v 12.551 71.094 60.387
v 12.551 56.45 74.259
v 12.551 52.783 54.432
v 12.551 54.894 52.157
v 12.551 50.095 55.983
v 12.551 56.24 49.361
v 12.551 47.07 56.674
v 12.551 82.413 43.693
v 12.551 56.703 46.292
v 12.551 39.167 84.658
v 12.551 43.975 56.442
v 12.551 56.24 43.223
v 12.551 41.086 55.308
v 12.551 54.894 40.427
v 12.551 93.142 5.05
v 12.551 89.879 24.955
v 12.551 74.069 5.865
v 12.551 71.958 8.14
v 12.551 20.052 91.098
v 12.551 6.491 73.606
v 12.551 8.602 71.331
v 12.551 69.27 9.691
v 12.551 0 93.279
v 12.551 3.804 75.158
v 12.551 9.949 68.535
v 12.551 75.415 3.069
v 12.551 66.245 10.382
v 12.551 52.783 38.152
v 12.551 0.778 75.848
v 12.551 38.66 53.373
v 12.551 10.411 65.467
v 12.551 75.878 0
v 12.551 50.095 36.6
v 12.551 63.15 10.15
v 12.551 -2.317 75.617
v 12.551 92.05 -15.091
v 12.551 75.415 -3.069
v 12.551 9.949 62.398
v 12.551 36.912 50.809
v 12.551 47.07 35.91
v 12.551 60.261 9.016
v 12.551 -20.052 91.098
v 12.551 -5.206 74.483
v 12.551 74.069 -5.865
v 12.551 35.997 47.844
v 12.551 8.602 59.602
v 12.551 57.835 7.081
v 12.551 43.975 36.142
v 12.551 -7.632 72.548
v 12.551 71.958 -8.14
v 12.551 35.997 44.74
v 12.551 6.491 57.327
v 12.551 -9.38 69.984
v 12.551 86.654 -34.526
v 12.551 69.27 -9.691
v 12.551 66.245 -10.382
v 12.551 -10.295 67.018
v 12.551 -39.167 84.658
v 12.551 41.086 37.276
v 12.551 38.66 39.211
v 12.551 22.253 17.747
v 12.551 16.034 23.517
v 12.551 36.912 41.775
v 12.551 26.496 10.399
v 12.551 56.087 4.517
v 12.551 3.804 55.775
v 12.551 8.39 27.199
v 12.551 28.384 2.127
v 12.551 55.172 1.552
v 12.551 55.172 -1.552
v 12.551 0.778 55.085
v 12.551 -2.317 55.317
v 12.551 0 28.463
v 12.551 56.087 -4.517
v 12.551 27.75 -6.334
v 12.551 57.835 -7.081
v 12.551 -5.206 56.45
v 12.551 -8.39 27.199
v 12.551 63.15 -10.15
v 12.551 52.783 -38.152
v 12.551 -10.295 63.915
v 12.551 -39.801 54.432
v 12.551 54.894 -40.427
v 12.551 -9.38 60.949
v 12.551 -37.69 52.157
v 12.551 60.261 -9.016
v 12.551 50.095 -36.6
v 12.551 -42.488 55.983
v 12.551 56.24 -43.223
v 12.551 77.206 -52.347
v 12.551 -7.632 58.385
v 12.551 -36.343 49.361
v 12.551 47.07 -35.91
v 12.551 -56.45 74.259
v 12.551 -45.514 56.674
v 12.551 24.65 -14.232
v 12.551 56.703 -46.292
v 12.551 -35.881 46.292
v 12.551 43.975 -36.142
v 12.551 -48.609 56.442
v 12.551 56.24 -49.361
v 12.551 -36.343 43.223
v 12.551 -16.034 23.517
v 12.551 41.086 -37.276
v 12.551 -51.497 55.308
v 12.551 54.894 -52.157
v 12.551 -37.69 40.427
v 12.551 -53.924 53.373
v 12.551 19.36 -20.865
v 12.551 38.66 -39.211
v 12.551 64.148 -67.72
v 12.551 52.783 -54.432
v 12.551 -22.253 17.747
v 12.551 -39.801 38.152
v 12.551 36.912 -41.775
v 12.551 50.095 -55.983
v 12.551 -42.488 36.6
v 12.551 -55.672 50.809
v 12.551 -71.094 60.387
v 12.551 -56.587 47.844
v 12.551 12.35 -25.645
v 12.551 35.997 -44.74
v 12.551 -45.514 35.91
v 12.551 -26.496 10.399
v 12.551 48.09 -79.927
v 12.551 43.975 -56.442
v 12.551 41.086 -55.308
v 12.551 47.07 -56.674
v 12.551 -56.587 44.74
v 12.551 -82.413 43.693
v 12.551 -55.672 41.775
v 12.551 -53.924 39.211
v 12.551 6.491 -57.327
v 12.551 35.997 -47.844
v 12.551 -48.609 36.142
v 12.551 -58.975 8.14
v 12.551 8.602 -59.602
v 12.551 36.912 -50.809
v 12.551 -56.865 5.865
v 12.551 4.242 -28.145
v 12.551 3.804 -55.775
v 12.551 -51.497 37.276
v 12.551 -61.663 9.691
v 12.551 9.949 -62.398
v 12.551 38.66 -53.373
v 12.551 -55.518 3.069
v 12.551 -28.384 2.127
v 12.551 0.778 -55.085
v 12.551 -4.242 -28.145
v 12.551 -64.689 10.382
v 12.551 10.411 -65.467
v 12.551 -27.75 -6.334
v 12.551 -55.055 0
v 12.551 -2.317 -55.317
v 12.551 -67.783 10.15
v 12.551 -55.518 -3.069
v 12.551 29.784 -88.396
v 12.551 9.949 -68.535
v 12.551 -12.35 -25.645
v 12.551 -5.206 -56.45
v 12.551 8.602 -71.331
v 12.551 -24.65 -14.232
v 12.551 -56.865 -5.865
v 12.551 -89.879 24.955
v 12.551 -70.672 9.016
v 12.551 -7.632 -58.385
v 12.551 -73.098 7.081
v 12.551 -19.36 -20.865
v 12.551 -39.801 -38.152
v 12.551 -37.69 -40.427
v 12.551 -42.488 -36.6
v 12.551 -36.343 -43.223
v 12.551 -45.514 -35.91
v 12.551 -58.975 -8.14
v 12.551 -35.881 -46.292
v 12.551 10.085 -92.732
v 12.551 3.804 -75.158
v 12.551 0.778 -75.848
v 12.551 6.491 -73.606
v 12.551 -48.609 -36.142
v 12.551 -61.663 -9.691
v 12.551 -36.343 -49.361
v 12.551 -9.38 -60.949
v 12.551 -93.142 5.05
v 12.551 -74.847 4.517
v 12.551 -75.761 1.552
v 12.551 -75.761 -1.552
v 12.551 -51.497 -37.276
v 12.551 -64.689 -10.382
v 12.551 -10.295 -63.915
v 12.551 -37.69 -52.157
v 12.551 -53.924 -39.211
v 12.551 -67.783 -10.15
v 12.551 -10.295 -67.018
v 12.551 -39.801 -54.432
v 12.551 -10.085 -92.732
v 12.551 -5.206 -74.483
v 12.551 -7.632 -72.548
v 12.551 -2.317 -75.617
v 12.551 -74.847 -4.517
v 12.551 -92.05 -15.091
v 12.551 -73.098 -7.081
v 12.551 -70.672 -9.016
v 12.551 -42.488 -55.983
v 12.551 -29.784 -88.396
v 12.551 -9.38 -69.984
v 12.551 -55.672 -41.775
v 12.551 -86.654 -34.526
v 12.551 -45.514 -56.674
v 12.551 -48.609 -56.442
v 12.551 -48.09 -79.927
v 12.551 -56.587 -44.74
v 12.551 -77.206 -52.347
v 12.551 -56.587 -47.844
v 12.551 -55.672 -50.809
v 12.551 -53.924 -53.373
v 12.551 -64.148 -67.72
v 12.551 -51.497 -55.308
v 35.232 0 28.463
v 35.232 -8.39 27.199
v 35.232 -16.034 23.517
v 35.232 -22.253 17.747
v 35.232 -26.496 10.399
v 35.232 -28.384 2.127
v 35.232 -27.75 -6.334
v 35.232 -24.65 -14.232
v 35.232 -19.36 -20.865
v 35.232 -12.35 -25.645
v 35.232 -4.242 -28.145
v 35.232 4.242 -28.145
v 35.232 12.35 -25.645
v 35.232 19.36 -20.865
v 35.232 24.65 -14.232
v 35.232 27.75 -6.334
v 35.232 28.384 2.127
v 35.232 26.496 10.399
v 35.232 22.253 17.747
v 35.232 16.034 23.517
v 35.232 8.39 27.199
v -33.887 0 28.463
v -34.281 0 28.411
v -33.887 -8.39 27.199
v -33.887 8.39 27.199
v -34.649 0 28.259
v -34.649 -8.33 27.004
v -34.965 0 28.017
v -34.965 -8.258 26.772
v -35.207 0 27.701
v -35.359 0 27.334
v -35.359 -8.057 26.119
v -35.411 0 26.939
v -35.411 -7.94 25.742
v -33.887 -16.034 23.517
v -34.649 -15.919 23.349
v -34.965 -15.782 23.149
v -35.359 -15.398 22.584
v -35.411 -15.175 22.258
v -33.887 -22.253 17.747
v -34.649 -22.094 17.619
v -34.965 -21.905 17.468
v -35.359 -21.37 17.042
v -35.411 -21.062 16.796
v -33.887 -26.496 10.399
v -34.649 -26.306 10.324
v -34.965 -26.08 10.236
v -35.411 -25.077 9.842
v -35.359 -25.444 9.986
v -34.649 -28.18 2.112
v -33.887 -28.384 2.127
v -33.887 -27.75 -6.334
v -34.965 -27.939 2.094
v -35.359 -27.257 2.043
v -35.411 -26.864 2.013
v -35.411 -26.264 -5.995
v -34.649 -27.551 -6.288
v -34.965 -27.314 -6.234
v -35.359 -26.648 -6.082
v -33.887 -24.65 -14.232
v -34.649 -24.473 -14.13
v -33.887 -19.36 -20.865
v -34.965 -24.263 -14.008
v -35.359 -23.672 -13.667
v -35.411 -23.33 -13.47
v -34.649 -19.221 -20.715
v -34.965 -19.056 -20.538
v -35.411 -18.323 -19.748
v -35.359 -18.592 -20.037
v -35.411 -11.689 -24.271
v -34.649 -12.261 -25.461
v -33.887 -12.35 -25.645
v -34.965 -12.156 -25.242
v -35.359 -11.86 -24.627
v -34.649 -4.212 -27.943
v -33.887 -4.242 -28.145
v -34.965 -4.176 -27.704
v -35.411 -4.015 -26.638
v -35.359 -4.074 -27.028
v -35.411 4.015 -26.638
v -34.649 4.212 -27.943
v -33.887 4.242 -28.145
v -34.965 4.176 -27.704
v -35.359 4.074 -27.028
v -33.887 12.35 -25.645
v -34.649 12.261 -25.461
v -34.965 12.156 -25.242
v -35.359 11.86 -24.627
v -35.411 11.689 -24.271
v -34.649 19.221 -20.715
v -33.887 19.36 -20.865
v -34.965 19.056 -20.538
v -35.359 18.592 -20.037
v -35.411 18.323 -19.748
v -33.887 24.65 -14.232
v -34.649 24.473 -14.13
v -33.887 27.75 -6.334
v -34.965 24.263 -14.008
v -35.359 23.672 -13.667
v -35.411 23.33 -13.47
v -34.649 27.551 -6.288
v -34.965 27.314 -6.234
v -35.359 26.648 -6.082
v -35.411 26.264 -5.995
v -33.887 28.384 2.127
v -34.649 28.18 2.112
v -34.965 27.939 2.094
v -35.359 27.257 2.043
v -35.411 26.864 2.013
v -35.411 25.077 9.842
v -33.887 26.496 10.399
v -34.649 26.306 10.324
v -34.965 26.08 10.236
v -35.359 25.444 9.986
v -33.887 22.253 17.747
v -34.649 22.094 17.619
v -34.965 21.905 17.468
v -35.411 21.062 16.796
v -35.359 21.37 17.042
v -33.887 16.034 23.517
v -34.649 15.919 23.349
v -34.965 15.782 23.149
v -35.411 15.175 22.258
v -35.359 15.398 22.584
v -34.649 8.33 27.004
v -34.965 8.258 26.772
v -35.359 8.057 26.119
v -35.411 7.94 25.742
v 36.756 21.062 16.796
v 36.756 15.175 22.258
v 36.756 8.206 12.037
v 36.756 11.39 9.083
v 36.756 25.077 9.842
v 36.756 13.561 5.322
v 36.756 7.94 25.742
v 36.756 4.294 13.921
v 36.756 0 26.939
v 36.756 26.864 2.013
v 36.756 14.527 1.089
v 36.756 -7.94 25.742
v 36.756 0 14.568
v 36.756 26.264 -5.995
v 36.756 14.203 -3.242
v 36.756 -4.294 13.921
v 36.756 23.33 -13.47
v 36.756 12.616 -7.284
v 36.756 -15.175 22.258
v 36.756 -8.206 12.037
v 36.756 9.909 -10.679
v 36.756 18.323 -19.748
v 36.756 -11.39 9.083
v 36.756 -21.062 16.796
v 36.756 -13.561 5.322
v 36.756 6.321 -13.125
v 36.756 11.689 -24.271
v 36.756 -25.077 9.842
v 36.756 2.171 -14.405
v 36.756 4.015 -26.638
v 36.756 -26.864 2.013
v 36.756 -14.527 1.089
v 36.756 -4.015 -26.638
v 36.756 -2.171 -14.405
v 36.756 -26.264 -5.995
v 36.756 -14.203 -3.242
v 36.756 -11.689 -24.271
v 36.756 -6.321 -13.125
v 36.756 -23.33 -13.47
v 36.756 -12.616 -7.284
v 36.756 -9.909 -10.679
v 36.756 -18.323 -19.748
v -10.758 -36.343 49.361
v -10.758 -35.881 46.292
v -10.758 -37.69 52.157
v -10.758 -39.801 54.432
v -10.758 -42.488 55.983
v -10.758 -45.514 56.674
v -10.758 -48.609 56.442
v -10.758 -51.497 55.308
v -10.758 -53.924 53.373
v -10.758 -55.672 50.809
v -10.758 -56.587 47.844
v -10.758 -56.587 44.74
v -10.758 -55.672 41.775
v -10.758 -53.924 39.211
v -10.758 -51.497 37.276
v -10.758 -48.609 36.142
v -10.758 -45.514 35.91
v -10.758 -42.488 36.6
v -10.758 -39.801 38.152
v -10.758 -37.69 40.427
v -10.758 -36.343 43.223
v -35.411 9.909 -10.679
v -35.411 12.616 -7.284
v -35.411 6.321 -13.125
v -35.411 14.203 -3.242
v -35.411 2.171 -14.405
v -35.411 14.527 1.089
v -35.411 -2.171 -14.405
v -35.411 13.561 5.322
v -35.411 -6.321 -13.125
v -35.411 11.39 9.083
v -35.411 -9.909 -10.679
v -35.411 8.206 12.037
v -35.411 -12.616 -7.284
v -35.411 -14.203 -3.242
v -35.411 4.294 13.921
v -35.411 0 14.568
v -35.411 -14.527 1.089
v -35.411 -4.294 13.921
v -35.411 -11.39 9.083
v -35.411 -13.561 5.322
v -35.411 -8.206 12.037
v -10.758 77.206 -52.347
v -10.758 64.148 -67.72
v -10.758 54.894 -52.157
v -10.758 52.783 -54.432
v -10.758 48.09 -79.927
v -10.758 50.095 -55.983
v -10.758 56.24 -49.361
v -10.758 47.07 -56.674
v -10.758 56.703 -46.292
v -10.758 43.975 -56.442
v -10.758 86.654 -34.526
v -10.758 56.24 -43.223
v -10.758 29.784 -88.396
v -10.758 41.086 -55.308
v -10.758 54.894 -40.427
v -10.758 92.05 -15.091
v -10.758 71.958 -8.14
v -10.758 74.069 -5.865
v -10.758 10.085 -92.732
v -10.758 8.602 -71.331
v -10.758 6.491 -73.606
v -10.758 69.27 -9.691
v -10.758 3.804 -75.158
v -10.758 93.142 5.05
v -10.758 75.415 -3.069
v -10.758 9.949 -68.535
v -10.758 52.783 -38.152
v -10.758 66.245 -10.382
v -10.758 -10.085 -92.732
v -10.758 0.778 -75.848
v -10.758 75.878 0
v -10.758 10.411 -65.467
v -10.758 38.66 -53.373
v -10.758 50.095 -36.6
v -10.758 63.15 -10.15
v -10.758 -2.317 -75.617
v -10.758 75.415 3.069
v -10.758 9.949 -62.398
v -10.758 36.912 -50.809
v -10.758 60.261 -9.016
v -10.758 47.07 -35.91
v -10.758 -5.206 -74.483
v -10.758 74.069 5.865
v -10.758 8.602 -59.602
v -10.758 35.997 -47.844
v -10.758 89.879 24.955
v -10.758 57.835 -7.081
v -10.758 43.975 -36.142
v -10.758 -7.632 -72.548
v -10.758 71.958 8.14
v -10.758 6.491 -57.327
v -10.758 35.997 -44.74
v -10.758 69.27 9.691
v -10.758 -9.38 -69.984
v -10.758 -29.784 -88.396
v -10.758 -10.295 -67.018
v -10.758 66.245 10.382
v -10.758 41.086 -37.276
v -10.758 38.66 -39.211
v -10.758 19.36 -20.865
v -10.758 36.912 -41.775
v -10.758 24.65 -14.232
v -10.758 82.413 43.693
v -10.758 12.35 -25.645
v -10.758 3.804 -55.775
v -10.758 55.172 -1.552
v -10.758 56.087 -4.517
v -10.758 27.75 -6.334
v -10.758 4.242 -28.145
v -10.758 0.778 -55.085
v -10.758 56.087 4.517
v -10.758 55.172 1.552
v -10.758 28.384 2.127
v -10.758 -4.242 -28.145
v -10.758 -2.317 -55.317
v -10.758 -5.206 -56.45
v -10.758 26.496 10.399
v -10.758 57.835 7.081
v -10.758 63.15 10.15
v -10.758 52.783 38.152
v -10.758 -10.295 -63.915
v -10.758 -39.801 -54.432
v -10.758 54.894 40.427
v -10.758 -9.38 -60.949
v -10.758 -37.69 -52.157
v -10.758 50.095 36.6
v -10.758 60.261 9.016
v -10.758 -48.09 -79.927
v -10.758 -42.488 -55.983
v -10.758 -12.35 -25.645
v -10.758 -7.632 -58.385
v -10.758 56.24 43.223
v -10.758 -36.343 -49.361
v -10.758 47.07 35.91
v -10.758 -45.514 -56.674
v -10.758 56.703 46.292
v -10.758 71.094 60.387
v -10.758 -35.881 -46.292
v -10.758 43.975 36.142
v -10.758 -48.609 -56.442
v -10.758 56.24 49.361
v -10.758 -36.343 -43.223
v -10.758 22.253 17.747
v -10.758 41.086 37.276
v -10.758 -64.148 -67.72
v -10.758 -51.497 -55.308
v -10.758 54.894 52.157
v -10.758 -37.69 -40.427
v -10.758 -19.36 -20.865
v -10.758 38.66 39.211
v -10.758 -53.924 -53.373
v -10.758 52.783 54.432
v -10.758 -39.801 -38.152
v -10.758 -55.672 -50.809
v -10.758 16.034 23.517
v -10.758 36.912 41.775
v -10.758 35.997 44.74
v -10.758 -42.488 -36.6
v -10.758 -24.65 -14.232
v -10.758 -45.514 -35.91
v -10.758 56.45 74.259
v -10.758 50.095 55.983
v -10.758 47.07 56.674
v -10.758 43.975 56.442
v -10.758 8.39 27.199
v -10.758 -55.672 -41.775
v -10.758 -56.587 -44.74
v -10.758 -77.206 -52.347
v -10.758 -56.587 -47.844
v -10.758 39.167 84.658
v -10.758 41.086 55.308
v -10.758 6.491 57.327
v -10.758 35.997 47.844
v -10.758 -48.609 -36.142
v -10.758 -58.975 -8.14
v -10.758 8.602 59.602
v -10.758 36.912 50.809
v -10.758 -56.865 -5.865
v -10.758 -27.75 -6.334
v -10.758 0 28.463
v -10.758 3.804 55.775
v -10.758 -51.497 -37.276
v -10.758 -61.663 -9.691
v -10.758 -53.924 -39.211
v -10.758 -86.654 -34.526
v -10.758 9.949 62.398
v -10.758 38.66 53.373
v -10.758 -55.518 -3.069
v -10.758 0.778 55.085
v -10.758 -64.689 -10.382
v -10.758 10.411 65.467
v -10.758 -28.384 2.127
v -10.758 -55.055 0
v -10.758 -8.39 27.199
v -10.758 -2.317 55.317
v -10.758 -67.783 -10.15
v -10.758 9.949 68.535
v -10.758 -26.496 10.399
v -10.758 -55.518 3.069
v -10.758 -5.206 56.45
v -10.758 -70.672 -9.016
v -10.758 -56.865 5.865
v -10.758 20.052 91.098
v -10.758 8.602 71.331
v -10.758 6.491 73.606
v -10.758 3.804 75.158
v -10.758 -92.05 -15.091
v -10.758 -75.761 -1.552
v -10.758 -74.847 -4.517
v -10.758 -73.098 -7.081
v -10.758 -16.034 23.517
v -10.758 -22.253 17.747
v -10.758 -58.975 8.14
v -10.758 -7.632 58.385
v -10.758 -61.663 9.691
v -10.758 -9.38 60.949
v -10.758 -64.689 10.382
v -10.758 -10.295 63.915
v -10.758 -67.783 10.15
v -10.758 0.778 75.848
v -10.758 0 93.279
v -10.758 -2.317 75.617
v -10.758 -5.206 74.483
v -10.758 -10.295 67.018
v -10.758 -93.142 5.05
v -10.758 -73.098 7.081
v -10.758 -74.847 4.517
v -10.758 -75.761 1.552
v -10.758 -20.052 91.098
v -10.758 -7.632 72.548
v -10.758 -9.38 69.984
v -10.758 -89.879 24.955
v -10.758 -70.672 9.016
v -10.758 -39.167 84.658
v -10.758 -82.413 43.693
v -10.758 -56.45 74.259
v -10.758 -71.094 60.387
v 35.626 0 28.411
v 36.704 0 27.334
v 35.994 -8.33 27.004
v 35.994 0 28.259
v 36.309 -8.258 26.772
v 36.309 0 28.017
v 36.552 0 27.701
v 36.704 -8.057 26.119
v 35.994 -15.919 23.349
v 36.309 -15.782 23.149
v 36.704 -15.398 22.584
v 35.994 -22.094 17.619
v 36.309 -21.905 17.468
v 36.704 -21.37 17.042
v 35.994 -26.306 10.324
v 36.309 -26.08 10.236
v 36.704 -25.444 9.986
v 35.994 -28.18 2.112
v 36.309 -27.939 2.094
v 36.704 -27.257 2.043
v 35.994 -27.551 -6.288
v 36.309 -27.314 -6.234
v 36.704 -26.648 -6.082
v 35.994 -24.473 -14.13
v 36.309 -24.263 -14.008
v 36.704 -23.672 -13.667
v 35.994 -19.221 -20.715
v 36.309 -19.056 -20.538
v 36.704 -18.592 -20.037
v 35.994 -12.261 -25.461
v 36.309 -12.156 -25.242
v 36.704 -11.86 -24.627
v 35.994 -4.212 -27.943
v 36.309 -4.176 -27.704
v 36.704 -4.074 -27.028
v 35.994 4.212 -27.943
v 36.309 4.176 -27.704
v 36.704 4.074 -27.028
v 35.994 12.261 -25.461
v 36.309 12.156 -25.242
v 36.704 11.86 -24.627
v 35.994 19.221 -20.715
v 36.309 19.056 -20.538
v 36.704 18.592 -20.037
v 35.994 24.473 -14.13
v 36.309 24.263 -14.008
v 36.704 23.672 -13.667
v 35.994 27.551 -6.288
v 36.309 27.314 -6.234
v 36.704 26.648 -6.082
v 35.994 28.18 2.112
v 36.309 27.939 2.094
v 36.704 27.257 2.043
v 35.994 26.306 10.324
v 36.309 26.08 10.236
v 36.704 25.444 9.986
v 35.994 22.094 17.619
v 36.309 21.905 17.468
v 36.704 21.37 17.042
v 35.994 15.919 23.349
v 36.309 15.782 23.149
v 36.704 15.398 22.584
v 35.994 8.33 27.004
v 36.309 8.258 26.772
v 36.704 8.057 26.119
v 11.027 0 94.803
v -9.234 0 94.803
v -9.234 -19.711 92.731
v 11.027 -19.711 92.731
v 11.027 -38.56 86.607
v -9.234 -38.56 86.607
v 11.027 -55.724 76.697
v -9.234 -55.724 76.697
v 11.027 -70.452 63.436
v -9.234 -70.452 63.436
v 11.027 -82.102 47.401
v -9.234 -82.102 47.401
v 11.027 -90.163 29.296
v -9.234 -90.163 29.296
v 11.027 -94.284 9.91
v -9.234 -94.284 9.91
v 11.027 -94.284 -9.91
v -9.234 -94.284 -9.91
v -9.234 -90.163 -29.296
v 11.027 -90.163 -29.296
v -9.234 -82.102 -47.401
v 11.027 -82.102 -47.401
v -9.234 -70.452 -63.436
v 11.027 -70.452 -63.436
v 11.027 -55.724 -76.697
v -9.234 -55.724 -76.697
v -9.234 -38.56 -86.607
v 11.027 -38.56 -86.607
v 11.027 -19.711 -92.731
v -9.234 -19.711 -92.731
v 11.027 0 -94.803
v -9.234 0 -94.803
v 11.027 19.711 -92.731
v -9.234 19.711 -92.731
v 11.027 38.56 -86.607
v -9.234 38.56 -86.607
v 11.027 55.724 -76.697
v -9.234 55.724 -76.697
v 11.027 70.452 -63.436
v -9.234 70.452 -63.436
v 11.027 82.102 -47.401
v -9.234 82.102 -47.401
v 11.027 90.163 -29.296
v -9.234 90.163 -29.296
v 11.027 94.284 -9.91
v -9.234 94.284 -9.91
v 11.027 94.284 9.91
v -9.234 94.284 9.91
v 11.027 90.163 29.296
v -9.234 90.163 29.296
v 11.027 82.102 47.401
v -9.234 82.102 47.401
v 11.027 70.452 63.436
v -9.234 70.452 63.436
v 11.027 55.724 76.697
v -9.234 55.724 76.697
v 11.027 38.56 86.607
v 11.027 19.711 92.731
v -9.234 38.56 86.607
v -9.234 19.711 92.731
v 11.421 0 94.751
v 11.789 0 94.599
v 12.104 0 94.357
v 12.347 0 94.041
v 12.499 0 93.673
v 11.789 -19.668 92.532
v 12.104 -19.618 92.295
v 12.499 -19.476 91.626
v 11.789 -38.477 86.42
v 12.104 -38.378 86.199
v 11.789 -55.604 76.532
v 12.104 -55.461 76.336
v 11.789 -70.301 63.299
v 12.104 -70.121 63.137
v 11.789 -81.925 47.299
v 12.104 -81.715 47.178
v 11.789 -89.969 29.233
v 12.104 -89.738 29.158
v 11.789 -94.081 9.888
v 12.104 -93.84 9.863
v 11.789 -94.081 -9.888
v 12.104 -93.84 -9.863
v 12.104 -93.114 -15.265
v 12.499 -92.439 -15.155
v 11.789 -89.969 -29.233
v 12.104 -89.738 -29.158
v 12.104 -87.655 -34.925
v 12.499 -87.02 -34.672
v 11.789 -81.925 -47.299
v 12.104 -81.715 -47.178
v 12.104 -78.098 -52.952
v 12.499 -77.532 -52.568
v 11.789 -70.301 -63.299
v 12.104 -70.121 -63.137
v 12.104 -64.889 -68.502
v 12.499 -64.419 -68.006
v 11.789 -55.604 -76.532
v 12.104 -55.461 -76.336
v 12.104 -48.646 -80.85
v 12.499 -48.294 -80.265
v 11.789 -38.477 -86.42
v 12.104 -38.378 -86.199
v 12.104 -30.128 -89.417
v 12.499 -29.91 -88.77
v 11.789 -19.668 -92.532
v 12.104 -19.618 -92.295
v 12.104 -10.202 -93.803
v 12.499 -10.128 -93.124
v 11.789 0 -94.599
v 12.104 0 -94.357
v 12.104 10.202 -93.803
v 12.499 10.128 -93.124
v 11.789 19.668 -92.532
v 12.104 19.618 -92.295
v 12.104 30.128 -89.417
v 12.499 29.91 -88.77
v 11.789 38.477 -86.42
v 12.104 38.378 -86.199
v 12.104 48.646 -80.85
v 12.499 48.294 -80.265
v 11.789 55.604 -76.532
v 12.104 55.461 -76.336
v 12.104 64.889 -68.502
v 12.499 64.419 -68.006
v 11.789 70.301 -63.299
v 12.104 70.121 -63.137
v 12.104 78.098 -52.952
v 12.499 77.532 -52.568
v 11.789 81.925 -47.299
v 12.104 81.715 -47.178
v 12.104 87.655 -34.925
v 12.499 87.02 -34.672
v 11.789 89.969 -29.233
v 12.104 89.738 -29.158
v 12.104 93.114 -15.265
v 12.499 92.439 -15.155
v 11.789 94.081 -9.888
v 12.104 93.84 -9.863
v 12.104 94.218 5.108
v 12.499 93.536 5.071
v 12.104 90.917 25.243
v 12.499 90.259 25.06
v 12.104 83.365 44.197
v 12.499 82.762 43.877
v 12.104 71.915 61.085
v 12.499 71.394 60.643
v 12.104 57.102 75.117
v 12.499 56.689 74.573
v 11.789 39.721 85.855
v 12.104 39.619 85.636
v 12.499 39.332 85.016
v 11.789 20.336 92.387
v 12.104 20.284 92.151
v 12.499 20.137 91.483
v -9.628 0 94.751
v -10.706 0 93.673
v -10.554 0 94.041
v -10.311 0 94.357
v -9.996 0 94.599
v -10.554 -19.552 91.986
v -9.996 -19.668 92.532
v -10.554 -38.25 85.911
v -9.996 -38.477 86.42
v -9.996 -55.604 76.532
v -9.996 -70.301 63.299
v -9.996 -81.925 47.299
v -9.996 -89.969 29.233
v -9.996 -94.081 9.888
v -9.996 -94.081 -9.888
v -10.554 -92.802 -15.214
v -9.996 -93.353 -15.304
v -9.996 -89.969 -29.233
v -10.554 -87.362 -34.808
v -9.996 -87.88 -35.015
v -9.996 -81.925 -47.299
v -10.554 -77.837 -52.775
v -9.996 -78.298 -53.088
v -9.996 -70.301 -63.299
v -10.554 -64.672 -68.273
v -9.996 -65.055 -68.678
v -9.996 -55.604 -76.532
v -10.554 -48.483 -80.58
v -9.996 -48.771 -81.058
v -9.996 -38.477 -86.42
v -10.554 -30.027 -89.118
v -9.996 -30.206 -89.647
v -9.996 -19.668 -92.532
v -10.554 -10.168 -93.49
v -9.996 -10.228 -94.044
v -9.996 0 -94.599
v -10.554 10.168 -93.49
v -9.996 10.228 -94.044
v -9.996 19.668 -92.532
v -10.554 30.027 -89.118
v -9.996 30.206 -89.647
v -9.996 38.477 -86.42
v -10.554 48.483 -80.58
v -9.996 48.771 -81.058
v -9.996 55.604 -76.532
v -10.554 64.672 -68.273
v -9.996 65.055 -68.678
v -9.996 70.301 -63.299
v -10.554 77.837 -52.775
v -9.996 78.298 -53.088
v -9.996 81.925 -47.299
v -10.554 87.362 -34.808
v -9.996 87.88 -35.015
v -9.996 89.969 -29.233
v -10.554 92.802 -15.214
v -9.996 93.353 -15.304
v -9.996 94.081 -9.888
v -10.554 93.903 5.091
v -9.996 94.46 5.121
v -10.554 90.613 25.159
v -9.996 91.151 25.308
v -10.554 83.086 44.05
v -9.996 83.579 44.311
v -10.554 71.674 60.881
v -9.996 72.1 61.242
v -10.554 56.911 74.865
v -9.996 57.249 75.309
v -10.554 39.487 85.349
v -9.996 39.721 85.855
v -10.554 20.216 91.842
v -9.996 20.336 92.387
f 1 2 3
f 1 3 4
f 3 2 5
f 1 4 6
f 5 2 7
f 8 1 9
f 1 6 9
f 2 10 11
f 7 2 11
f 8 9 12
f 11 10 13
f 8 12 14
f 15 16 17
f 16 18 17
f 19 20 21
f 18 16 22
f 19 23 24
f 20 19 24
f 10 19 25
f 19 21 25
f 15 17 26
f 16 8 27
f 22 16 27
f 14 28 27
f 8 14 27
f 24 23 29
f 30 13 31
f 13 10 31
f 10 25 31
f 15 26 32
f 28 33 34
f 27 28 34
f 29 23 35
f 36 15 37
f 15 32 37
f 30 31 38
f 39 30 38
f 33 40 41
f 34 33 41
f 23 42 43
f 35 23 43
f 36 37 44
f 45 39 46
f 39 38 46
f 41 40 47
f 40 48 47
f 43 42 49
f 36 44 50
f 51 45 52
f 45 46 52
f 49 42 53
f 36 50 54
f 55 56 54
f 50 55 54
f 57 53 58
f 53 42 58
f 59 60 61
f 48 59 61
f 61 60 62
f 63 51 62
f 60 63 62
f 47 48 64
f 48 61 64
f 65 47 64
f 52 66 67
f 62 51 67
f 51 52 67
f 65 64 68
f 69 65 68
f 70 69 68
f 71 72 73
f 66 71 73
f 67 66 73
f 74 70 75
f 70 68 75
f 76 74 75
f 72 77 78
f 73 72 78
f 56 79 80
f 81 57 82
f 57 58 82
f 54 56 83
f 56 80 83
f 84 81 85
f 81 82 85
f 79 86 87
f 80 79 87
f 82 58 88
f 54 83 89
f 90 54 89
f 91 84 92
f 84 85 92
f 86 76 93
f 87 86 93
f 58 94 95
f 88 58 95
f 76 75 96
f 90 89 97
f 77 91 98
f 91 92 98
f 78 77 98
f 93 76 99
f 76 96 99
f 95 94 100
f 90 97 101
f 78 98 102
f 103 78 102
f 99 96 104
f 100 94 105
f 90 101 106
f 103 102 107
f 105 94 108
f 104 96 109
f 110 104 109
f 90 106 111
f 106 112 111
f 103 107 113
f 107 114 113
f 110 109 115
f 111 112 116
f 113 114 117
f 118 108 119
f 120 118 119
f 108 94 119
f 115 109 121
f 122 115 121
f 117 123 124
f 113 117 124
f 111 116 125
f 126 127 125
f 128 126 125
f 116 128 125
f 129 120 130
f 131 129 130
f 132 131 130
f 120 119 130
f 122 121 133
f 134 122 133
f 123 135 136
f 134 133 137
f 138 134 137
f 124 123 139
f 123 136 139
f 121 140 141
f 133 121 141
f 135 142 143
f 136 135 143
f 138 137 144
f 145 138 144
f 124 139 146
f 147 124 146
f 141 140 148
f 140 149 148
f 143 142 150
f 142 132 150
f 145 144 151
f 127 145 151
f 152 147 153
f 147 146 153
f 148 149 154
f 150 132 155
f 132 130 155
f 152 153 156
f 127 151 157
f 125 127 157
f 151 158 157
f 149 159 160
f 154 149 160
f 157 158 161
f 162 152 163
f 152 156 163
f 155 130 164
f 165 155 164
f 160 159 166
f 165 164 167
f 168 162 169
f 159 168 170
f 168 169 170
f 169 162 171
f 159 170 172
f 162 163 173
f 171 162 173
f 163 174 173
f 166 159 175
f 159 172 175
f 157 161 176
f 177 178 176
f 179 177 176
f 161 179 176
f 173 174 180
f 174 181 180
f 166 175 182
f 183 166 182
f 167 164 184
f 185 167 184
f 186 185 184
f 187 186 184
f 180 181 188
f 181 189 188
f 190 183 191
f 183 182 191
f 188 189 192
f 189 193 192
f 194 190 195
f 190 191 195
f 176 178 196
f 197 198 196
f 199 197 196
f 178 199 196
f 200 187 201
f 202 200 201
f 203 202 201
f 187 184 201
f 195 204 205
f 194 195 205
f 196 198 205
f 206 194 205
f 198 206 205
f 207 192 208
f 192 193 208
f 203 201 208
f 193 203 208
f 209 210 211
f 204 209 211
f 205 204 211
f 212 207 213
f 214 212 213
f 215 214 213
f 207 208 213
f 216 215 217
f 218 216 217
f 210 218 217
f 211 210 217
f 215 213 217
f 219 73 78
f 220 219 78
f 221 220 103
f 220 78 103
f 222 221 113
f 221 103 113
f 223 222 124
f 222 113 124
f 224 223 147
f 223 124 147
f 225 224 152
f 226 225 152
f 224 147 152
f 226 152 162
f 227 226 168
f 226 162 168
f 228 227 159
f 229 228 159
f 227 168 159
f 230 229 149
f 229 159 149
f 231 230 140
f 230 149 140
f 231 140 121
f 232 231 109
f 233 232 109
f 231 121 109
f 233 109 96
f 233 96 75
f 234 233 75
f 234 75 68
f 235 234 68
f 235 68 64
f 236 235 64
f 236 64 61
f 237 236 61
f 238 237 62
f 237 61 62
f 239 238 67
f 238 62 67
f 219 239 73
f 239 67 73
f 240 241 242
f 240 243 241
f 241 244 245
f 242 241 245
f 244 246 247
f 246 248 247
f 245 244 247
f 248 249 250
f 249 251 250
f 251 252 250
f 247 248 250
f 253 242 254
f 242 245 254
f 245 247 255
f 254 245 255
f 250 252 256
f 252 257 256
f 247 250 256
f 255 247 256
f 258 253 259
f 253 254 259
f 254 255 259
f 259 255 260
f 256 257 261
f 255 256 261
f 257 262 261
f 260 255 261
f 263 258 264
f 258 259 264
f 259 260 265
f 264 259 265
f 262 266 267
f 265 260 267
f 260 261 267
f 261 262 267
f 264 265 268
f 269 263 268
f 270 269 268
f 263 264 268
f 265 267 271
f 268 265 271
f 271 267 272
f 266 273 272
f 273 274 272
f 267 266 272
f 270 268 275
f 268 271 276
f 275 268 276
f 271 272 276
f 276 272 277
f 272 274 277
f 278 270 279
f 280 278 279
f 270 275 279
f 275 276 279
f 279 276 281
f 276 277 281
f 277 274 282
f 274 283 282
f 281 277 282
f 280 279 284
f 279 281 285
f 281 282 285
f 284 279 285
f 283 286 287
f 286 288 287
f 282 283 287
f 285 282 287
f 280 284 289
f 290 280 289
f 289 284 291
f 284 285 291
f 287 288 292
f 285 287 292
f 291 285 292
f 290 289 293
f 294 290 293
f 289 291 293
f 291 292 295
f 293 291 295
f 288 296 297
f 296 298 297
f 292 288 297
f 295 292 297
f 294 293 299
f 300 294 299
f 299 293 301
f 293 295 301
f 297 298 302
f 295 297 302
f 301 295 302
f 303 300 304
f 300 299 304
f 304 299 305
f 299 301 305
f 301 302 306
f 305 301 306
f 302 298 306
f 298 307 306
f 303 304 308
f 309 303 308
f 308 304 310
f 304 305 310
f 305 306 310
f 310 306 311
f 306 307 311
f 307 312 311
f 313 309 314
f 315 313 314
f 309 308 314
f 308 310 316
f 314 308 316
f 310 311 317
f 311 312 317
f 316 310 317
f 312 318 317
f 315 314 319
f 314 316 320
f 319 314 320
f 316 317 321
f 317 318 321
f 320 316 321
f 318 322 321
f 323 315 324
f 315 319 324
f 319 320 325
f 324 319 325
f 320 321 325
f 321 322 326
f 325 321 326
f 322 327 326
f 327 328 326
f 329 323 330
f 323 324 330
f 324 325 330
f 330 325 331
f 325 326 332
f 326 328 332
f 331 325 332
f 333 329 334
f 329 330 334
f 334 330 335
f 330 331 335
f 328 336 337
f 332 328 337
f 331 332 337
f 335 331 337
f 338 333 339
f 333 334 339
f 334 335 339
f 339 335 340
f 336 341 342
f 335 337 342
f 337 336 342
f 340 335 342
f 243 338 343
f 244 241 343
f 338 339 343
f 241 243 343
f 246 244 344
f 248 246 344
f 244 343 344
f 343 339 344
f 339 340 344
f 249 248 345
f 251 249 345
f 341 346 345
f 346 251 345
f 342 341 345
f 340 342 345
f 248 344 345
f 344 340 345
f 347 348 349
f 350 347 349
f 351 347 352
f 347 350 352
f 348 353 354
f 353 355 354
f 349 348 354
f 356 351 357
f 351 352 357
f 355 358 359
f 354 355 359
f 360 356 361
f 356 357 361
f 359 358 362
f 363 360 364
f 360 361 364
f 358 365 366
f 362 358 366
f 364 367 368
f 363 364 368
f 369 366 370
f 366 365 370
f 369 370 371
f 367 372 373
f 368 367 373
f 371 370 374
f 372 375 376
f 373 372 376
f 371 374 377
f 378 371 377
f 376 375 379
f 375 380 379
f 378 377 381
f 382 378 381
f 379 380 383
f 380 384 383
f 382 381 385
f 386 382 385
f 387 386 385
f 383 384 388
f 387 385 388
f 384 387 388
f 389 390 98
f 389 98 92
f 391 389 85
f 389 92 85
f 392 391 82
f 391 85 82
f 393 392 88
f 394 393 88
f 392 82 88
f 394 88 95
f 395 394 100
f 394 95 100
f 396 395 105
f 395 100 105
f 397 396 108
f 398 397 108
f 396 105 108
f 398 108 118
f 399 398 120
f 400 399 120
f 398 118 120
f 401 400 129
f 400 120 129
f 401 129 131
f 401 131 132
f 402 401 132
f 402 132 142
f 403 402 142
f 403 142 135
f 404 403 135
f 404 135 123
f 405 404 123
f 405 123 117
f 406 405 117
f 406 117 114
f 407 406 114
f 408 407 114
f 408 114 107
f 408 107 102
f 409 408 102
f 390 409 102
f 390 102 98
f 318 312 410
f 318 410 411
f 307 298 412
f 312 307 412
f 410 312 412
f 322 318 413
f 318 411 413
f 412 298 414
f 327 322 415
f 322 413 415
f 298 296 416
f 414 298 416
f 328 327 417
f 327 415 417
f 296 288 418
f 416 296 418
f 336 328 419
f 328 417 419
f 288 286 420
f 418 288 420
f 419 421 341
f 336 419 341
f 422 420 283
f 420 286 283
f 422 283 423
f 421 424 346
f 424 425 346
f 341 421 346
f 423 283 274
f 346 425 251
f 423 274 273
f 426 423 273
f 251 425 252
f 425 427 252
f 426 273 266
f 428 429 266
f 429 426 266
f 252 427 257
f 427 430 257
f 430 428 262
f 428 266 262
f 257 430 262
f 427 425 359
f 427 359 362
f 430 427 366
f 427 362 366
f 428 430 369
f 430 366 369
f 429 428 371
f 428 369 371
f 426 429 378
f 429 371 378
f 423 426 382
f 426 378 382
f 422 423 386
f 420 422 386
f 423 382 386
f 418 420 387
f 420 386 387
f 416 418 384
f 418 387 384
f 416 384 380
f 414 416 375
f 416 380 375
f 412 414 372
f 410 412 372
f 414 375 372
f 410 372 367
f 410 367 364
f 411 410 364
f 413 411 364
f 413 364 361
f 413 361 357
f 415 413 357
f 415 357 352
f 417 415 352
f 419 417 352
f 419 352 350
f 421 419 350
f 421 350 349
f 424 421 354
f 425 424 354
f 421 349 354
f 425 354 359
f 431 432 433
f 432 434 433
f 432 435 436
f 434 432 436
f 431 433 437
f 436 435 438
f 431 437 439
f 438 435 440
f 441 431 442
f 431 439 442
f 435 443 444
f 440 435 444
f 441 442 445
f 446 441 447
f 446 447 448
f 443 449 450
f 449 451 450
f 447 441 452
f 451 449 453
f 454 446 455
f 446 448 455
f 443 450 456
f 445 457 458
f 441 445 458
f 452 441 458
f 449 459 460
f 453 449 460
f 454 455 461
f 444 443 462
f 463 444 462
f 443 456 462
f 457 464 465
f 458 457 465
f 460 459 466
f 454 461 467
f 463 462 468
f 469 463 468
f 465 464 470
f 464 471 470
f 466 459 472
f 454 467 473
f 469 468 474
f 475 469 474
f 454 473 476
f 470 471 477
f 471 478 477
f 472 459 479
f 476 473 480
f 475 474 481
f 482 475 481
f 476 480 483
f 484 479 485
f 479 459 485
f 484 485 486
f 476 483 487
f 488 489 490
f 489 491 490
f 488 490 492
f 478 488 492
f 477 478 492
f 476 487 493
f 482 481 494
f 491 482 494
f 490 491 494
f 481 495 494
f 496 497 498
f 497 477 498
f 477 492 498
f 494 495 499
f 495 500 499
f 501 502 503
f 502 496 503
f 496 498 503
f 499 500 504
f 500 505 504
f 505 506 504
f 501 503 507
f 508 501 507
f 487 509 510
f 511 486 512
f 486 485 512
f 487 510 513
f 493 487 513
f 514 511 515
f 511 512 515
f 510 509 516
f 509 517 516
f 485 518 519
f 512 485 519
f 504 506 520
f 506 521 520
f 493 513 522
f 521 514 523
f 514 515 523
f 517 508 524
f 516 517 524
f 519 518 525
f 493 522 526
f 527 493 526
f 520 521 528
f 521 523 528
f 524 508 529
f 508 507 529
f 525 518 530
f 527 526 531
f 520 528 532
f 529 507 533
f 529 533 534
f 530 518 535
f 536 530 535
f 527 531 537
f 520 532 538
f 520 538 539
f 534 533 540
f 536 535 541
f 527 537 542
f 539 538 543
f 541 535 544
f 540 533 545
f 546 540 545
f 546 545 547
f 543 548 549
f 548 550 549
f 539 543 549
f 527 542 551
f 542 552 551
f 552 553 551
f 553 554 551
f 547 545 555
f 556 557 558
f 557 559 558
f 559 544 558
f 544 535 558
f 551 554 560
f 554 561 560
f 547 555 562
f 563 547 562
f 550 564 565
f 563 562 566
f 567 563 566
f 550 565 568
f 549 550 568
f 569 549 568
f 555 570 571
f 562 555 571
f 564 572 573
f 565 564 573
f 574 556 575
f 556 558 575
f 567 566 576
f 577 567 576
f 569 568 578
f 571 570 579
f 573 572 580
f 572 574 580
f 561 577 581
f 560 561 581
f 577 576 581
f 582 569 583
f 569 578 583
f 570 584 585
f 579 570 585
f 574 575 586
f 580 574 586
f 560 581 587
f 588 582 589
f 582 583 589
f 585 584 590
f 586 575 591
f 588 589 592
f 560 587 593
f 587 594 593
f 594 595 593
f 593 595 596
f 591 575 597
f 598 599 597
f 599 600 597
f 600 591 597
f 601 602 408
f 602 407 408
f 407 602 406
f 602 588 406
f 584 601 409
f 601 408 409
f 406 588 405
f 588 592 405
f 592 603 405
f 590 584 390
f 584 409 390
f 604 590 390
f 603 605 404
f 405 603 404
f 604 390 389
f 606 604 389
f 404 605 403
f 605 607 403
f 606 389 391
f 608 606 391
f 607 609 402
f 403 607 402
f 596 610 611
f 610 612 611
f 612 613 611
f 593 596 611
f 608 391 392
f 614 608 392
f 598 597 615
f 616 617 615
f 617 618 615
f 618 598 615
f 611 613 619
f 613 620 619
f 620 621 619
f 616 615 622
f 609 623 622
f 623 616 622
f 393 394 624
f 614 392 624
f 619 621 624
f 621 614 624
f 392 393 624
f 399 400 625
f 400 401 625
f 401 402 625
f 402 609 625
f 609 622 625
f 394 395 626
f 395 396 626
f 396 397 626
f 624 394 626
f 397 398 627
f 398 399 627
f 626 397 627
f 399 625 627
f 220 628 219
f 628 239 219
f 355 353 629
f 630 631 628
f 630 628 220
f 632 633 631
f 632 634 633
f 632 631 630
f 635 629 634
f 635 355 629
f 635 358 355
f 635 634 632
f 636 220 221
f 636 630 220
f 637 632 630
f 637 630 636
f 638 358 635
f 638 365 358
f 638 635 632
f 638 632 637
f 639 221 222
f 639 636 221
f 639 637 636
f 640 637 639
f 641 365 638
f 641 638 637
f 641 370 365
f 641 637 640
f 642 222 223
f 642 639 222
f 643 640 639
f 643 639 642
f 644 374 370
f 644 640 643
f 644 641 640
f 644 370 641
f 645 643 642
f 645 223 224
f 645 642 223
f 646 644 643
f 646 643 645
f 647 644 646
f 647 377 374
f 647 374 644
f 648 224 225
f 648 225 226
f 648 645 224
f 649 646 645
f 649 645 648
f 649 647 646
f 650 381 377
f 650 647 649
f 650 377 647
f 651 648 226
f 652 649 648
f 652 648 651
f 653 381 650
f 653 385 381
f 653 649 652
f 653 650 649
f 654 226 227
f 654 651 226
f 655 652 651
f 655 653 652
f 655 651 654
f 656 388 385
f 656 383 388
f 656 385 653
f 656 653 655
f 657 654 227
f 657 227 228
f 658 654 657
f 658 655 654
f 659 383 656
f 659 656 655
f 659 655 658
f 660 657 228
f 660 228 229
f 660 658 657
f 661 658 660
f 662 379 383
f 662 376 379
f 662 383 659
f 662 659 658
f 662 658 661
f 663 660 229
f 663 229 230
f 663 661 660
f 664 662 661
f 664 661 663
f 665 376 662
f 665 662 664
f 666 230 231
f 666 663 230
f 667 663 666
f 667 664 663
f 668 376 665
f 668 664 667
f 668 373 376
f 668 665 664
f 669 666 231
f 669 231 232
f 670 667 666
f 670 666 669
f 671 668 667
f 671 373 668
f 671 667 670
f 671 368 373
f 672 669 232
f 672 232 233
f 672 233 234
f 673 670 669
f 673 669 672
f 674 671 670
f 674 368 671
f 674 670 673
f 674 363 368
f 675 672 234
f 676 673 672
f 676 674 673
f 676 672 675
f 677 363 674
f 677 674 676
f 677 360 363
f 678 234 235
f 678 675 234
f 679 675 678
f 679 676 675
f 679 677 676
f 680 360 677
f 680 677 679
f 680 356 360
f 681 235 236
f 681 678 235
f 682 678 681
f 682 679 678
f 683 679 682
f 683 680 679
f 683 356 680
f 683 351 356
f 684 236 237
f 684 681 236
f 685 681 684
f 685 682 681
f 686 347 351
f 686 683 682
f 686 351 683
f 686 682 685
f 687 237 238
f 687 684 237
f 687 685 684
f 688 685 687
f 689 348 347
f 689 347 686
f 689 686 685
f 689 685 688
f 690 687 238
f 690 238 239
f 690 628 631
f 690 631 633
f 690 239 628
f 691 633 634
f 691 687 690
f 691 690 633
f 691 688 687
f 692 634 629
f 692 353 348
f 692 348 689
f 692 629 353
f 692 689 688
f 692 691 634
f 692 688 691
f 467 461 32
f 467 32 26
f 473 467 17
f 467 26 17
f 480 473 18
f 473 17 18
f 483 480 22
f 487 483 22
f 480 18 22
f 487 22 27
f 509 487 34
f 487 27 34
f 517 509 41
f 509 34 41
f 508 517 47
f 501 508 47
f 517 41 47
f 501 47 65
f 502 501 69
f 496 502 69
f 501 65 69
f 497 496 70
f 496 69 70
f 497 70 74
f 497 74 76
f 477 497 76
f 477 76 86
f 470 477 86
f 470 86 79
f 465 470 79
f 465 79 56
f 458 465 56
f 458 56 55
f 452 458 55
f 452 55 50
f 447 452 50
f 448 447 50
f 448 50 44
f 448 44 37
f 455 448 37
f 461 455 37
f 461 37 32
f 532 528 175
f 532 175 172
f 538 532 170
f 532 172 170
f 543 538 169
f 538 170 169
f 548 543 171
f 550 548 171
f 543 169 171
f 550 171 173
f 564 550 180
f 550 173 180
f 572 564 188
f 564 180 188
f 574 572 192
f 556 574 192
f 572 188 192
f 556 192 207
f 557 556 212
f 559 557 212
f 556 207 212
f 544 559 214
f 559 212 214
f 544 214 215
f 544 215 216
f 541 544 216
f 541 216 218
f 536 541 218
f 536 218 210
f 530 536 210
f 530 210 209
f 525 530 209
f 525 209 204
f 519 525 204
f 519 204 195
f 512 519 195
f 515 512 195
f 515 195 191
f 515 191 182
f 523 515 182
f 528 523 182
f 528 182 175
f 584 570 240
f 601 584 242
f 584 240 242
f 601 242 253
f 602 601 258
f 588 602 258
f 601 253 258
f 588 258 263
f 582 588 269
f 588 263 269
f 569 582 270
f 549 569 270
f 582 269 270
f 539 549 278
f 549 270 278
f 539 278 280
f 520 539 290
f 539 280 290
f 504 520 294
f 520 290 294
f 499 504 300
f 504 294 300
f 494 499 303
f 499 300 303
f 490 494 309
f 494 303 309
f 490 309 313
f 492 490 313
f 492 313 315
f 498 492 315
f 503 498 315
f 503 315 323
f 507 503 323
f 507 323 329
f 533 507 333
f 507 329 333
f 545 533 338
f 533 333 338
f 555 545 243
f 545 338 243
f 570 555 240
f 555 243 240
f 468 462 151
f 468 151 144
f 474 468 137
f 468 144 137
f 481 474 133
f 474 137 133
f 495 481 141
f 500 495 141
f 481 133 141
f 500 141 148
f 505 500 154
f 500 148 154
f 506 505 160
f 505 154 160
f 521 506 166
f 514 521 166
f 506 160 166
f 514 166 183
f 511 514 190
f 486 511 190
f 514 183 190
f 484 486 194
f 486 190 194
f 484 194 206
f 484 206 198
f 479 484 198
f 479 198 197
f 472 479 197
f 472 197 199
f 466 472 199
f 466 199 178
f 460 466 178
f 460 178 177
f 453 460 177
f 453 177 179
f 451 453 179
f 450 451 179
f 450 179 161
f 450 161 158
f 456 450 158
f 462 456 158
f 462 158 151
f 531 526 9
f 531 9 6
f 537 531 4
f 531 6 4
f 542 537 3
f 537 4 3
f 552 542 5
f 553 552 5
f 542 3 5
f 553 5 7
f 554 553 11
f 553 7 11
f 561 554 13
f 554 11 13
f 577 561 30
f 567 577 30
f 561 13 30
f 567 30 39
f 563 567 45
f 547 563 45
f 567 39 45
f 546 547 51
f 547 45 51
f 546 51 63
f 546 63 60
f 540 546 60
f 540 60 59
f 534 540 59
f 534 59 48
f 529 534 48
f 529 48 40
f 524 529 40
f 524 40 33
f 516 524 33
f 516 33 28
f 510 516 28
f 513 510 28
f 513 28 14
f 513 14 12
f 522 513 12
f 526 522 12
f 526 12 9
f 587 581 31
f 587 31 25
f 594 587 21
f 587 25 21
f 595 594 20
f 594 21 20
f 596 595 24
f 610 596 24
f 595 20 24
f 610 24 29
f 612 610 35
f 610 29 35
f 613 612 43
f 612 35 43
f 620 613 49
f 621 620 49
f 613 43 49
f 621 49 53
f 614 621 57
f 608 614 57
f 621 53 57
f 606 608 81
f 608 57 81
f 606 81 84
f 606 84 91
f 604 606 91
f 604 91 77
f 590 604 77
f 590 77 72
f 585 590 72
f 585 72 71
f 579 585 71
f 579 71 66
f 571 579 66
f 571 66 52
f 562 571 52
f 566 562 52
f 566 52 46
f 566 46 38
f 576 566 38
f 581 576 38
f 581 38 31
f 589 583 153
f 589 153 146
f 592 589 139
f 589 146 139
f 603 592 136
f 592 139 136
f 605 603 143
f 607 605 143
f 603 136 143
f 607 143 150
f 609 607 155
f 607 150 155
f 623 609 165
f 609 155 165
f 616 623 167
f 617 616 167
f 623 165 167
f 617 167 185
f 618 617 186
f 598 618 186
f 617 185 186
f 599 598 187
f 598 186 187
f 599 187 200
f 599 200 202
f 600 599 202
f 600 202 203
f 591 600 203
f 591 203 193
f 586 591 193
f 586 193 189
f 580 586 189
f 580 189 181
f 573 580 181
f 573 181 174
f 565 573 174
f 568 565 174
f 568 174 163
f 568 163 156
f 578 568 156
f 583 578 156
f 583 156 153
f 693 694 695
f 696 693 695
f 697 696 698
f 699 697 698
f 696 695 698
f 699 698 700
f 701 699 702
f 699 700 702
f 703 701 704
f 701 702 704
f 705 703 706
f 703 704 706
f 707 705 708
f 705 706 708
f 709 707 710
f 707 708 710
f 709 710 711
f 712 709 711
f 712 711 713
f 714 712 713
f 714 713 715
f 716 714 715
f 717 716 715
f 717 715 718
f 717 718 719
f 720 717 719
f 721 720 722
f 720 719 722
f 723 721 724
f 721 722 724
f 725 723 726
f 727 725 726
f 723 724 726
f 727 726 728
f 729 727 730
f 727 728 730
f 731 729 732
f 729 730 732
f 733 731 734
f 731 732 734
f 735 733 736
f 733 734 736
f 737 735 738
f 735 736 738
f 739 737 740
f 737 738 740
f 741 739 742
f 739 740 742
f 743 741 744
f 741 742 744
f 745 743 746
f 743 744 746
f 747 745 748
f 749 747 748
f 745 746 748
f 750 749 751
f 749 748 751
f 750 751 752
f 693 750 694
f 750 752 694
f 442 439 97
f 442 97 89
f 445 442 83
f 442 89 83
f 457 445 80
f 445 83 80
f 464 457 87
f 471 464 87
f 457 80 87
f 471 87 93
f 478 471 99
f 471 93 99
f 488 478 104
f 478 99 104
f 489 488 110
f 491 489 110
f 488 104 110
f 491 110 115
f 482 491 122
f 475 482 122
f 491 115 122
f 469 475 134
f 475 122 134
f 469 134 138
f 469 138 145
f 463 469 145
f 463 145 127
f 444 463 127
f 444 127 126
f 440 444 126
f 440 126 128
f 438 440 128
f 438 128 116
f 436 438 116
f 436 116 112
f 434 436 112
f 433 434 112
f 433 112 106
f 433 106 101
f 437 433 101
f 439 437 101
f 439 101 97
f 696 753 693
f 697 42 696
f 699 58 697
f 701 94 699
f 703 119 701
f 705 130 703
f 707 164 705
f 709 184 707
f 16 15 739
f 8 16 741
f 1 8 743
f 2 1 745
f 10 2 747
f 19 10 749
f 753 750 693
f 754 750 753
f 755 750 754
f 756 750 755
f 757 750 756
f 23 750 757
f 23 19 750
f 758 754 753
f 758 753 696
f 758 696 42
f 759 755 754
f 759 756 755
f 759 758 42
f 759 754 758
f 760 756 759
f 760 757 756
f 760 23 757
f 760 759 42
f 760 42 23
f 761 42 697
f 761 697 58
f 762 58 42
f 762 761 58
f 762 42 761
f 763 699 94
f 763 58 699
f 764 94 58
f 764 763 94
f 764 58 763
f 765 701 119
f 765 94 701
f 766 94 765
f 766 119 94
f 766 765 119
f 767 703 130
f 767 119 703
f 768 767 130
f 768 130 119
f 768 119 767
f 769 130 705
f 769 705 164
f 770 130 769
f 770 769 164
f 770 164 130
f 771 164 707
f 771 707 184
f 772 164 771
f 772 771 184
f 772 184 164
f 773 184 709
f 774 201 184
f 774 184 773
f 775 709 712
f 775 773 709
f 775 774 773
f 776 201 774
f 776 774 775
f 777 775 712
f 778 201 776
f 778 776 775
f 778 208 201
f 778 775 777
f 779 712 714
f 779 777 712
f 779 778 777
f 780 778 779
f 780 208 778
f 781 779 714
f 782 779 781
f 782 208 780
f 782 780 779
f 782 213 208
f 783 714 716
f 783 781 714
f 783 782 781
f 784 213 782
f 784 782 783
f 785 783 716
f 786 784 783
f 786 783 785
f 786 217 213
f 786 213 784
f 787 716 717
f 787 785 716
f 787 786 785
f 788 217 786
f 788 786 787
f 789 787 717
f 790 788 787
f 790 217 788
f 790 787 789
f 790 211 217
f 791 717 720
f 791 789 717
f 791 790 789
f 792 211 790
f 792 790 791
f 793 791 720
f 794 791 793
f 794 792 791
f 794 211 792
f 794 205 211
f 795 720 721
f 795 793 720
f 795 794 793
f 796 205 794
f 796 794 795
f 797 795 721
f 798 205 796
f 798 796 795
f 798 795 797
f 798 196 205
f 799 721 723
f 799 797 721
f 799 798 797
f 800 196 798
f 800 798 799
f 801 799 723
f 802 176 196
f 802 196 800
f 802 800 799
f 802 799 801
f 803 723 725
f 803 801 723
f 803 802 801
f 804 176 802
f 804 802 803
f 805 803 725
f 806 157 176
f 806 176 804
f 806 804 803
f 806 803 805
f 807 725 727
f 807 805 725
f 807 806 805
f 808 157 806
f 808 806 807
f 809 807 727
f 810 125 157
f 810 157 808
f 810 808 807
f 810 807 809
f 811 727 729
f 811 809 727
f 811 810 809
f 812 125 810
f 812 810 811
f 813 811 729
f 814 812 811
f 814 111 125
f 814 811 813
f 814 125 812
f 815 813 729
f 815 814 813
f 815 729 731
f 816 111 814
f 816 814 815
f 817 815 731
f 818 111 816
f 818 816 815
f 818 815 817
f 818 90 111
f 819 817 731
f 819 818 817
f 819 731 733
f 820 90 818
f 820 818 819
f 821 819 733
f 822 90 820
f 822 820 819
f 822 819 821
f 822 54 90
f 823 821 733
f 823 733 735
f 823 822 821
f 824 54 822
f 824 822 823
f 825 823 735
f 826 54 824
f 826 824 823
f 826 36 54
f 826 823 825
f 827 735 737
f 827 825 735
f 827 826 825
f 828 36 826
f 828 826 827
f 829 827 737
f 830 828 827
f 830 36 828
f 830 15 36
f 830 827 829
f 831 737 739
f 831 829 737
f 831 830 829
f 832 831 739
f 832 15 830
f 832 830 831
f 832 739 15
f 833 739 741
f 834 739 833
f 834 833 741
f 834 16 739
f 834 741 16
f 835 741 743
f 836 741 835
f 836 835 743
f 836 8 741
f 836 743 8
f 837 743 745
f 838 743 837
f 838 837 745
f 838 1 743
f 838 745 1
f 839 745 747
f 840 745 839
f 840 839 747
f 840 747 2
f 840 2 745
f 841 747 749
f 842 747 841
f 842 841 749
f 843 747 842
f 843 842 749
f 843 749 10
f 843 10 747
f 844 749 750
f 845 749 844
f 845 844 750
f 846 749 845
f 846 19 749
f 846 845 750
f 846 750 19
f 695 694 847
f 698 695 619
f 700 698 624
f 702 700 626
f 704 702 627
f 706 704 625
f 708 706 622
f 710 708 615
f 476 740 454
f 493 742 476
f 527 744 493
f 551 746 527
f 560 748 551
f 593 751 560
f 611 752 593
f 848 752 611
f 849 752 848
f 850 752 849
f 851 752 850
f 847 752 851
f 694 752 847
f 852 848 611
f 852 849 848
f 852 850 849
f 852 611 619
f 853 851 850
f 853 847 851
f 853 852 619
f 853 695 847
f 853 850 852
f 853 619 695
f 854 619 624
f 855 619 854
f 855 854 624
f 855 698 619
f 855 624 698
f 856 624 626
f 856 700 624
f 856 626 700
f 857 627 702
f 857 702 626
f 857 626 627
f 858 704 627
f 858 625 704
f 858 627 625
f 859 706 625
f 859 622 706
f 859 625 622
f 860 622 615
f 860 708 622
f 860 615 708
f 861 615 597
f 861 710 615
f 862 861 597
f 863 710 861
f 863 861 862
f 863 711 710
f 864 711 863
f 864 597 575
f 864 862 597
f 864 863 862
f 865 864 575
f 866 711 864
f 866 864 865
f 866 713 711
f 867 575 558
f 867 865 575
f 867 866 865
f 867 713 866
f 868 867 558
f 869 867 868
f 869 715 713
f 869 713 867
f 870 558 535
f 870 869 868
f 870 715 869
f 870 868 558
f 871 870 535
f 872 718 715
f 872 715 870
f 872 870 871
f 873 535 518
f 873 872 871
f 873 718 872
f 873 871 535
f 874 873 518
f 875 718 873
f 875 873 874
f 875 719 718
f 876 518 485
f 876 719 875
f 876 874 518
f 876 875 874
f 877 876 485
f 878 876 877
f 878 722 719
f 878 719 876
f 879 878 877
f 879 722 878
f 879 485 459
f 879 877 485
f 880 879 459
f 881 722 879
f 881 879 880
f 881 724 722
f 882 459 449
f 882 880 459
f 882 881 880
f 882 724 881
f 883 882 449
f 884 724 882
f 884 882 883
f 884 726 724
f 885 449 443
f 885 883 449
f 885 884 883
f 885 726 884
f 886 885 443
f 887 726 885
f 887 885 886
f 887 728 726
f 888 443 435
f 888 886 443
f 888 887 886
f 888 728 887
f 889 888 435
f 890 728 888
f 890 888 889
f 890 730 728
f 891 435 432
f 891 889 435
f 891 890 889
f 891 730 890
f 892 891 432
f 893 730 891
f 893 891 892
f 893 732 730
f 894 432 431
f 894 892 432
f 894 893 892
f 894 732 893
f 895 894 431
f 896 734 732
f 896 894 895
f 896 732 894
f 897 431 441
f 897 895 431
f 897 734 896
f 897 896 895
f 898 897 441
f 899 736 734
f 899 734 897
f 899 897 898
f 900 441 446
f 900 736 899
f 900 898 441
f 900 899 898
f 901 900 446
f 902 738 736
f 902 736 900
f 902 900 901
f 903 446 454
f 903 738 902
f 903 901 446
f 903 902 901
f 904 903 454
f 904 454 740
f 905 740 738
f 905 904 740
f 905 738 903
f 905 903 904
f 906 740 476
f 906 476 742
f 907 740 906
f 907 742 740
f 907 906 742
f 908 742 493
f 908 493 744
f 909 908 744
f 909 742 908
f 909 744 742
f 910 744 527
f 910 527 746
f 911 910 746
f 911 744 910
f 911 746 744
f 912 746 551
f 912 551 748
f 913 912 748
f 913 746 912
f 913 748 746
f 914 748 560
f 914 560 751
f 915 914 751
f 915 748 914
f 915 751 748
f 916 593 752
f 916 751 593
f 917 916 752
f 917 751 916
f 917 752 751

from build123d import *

# Parameters (mm, degrees)
F2_R     = 10.411054
F3_DEPTH = 47.962751
F4_R     = 1.524
F5_R     = 1.524


with BuildPart() as f1:
    # F0 (on Front) → F1 (revolve)
    with BuildSketch(Plane.XZ):
        Polygon((-35.411011, 28.463284), (-35.411011, 14.567823), (36.755737, 14.567823), (36.755737, 28.463284), (12.55074, 28.463284), (12.55074, 94.802901), (-10.757774, 94.802901), (-10.757774, 28.463284), align=None)
    revolve(axis=Axis((-25.101472, 0, 0), (1, 0, 0)))

    # F2 (on face) → F3 (cut, through all)
    with BuildSketch(Plane.YZ.offset(12.55074)):
        with Locations((0, 65.46654)):
            Circle(F2_R)
        with Locations((-46.291835, 46.291835)):
            Circle(F2_R)
        with Locations((-65.46654, 0)):
            Circle(F2_R)
        with Locations((-46.291835, -46.291835)):
            Circle(F2_R)
        with Locations((0, -65.46654)):
            Circle(F2_R)
        with Locations((46.291835, -46.291835)):
            Circle(F2_R)
        with Locations((65.46654, 0)):
            Circle(F2_R)
        with Locations((46.291835, 46.291835)):
            Circle(F2_R)
    extrude(amount=-F3_DEPTH, mode=Mode.SUBTRACT)

    # F4
    f4_edges = [f1.edges().sort_by_distance(p)[0] for p in [
        (-10.757774, 0, -94.802901),
    ]]
    fillet(f4_edges, radius=F4_R)

    # F5
    f5_edges = [f1.edges().sort_by_distance(p)[0] for p in [
        (12.55074, 0, -94.802901),
        (36.755737, 0, -28.463284),
        (-35.411011, 0, -28.463284),
    ]]
    fillet(f5_edges, radius=F5_R)


solid = f1.part
